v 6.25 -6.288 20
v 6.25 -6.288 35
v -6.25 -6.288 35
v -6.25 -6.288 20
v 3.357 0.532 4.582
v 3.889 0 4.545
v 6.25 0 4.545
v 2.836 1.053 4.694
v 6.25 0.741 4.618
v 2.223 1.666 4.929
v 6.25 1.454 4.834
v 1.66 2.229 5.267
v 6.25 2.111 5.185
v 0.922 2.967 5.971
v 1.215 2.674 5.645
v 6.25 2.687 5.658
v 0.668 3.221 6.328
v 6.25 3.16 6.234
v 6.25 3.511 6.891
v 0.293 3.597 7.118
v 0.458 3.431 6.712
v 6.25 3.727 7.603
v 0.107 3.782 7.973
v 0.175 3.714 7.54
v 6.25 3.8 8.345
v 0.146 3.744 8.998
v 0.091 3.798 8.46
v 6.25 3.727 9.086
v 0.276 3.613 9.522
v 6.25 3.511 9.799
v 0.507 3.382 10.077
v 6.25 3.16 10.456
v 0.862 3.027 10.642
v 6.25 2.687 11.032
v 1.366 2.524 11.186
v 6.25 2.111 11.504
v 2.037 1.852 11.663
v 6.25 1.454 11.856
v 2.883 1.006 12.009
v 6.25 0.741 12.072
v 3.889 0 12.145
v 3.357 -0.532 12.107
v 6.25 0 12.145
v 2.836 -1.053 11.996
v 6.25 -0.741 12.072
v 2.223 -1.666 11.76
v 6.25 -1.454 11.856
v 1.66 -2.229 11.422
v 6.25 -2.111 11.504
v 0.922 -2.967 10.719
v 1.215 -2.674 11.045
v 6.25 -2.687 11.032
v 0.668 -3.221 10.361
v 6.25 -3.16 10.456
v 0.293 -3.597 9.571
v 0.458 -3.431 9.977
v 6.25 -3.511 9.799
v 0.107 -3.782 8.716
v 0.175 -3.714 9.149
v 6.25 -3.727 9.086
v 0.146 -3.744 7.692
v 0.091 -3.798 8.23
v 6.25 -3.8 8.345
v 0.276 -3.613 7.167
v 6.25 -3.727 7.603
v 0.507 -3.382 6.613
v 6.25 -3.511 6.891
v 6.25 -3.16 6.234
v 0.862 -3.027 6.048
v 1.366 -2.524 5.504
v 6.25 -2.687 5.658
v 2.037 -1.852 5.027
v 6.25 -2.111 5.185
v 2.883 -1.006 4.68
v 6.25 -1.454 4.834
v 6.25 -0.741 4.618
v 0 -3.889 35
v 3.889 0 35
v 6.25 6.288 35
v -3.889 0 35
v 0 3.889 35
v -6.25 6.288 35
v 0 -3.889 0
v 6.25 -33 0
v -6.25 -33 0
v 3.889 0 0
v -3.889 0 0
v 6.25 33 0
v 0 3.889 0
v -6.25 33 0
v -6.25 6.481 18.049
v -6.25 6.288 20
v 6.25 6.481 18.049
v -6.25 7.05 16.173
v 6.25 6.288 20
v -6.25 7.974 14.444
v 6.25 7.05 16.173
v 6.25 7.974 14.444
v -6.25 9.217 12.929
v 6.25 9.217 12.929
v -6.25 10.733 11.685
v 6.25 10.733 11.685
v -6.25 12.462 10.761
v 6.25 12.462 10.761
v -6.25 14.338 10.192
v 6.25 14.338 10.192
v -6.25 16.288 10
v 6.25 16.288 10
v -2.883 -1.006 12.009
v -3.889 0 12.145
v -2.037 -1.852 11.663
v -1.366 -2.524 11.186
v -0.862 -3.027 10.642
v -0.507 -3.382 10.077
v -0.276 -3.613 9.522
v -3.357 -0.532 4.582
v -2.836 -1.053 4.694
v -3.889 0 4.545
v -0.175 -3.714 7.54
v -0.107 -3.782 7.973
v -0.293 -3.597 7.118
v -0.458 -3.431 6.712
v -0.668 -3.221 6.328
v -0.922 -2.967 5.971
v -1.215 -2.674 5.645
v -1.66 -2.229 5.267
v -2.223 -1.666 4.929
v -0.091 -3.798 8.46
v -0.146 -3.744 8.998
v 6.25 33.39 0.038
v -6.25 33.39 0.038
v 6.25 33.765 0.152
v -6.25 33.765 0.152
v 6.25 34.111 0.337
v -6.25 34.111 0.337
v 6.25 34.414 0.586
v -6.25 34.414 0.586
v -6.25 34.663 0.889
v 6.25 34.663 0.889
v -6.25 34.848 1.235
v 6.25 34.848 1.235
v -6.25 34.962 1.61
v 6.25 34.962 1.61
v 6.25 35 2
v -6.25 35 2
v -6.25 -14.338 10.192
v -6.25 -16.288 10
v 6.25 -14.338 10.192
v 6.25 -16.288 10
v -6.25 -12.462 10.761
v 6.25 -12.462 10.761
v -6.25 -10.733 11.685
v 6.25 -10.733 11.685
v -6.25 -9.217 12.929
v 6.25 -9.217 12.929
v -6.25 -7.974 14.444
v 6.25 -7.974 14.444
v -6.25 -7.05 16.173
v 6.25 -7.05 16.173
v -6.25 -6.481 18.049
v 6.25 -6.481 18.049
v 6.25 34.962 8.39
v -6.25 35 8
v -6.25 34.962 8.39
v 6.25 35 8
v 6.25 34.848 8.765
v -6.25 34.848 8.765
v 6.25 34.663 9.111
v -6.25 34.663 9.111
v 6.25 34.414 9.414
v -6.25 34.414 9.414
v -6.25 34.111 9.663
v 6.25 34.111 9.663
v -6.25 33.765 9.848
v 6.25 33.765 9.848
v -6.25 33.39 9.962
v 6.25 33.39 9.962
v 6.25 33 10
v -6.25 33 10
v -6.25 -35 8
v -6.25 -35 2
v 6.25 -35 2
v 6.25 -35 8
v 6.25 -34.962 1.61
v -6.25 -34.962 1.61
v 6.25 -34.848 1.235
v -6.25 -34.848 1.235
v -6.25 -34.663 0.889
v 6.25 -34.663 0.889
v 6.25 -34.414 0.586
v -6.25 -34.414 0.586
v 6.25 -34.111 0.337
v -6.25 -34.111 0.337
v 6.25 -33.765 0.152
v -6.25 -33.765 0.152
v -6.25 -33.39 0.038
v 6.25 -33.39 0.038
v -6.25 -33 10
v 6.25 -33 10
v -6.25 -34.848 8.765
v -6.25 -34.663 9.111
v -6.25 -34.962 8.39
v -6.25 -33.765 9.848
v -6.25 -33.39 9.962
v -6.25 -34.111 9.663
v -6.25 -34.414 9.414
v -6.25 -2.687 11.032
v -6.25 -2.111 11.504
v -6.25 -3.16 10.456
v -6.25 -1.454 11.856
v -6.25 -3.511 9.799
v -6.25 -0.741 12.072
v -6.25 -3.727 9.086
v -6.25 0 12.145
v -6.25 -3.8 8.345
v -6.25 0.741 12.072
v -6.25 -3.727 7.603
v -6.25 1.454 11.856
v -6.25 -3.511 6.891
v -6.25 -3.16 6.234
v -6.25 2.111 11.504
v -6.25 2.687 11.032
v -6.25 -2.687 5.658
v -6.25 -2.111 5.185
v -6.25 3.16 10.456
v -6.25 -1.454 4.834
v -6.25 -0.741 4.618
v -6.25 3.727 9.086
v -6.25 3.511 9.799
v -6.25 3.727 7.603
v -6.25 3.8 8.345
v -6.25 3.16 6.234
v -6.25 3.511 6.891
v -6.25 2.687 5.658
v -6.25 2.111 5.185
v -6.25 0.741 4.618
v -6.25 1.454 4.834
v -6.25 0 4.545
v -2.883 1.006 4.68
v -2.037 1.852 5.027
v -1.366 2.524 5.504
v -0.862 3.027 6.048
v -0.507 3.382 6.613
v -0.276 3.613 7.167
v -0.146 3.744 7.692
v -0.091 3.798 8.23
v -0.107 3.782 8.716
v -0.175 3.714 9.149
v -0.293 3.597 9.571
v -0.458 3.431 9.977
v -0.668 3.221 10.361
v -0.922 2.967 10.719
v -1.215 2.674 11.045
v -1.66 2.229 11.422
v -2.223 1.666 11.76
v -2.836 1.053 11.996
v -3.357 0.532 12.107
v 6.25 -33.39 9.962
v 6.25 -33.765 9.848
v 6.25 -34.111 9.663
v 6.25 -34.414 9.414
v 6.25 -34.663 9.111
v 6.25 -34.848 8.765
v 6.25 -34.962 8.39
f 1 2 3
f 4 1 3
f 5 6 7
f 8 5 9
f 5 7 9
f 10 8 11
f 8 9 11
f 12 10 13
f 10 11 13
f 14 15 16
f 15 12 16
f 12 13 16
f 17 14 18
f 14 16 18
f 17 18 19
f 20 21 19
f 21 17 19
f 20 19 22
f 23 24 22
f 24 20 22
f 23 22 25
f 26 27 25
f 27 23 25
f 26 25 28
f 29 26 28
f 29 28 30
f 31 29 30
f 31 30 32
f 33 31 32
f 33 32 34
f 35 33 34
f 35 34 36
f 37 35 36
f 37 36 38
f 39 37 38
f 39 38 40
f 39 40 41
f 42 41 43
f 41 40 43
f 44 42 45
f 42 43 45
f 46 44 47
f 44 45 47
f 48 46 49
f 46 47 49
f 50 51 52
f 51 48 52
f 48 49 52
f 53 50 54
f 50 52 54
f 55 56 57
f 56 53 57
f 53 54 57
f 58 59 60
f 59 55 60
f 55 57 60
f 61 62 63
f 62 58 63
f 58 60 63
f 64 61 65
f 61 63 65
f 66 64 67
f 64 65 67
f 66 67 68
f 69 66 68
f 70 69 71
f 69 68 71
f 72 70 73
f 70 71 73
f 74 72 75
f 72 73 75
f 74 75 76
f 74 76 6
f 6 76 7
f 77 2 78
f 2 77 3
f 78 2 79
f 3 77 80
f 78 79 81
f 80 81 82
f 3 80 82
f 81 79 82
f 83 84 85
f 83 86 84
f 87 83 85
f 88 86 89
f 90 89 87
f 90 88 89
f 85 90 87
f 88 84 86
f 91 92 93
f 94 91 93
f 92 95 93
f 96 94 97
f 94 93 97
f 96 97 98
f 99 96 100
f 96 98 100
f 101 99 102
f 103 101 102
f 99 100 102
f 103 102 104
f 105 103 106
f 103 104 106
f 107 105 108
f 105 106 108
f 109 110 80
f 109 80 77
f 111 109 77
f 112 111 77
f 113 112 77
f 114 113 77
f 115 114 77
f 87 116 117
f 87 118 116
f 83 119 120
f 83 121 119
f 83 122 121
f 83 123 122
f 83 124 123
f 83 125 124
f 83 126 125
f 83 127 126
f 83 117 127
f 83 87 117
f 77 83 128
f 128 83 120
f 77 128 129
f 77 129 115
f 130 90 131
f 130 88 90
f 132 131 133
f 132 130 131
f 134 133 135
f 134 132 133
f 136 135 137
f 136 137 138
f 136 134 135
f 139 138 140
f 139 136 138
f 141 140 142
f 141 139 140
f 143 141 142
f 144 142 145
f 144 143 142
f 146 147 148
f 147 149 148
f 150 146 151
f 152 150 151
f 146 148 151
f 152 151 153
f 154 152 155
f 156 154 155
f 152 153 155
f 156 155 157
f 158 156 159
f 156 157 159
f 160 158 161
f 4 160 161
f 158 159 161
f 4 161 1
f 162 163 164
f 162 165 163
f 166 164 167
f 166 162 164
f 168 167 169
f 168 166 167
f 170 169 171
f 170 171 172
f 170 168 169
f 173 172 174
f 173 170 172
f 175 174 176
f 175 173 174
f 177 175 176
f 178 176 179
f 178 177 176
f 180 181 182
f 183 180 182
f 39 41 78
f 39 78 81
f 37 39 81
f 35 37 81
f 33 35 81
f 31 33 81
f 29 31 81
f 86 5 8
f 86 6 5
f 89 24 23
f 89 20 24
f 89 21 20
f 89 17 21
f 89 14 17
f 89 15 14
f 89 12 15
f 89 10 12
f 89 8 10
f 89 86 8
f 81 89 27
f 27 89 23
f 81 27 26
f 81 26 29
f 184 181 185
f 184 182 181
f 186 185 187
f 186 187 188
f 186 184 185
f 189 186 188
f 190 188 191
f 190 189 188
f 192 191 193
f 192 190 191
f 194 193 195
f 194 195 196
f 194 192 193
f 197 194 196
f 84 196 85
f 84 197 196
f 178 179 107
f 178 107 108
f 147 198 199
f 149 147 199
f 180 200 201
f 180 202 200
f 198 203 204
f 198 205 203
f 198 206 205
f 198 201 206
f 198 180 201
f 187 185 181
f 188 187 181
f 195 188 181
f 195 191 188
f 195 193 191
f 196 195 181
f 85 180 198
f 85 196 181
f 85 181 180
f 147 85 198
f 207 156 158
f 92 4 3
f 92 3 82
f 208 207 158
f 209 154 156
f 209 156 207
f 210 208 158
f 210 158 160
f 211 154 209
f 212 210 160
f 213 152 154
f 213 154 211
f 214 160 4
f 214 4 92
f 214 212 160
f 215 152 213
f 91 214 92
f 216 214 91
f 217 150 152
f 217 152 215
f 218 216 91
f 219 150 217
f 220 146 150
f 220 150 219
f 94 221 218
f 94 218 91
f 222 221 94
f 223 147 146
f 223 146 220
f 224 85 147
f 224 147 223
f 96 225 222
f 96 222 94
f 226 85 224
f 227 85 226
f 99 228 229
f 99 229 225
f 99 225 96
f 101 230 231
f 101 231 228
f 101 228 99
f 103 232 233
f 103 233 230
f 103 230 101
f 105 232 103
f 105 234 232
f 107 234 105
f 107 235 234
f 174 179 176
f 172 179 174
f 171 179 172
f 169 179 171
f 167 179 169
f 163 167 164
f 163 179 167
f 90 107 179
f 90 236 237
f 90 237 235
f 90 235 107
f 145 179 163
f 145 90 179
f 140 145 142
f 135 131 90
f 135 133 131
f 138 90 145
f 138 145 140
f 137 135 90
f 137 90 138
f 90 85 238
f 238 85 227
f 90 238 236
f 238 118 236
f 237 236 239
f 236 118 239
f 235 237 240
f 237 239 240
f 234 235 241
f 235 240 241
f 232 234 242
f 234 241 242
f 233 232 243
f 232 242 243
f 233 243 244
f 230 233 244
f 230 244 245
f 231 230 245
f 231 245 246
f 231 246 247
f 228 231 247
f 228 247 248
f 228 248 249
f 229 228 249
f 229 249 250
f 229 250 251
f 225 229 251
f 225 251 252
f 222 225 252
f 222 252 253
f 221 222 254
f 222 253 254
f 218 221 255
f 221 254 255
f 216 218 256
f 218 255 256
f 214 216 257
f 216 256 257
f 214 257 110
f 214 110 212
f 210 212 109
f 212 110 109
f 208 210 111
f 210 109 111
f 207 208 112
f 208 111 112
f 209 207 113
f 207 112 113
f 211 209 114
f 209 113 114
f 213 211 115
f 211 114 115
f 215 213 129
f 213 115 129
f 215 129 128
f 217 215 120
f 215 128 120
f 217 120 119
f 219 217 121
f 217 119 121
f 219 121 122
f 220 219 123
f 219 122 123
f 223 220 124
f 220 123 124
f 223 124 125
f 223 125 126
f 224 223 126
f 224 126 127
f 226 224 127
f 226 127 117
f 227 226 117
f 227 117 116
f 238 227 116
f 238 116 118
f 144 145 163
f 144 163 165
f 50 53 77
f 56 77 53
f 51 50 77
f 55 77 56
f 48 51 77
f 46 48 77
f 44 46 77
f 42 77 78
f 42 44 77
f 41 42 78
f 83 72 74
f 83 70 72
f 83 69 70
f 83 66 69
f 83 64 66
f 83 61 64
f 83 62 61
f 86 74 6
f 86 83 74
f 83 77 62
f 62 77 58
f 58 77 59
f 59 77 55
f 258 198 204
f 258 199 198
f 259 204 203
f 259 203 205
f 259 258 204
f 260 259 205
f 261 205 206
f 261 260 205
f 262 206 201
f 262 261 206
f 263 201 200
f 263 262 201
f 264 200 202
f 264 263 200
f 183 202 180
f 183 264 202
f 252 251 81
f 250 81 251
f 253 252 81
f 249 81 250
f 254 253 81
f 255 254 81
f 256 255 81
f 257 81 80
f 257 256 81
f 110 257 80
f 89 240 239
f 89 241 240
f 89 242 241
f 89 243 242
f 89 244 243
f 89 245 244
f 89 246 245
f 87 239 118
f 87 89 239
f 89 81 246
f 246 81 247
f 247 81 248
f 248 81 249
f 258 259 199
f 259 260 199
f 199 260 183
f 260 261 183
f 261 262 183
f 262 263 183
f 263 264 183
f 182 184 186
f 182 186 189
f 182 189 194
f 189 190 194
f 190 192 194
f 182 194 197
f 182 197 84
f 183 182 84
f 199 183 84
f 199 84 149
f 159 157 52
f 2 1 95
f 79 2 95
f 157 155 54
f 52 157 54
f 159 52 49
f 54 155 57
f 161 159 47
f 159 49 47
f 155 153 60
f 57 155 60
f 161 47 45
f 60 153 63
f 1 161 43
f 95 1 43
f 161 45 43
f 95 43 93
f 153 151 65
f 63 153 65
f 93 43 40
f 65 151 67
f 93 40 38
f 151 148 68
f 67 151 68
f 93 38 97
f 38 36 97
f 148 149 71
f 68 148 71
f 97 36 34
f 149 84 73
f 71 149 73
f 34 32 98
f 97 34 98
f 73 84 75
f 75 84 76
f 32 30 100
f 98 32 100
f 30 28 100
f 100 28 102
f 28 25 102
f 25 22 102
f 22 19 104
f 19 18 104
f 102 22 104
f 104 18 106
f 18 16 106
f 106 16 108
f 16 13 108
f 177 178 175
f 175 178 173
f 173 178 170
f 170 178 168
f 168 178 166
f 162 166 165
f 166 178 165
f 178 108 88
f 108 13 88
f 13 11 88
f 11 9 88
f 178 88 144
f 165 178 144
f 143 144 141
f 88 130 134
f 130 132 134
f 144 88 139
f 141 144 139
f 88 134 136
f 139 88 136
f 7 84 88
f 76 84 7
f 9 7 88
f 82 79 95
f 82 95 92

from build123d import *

# Parameters (mm, degrees)
ESQUISSE1_W             = 12.5
ESQUISSE1_H             = 70
BOSS_EXTRU_1_DEPTH      = 10
ESQUISSE2_W             = 12.5
ESQUISSE2_H             = 12.576917286
BOSS_EXTRU_2_DEPTH      = 35
ENL_V_MAT_EXTRU_1_DEPTH = 40
CONG_1_R                = 10
CONG_3_R                = 2
D_GAGEMENT_M71_D        = 7.6
D_GAGEMENT_M71_DEPTH    = 12.5
D_GAGEMENT_M71_TIP      = 2.283270352


with BuildPart() as part:
    # Esquisse1 → Boss.-Extru.1 (new body)
    with BuildSketch(Plane.XY):
        Rectangle(ESQUISSE1_W, ESQUISSE1_H)
    extrude(amount=BOSS_EXTRU_1_DEPTH)

    # Esquisse2 → Boss.-Extru.2 (add)
    with BuildSketch(Plane(origin=(0, 0, 0), x_dir=(-1, 0, 0), z_dir=(0, 0, -1))):
        Rectangle(ESQUISSE2_W, ESQUISSE2_H)
    extrude(amount=-BOSS_EXTRU_2_DEPTH)

    # Esquisse3 → Enlèv. mat.-Extru.1 (cut)
    with BuildSketch(Plane(origin=(0, 0, 0), x_dir=(-1, 0, 0), z_dir=(0, 0, -1))):
        Polygon((-3.889087297, 0), (0, 3.889087297), (3.889087297, 0), (0, -3.889087297), align=None)
    extrude(amount=-ENL_V_MAT_EXTRU_1_DEPTH, mode=Mode.SUBTRACT)

    # Congé1
    cong_1_edges = [part.edges().sort_by_distance(p)[0] for p in [
        (0, -6.288458643, 10),
        (0, 6.288458643, 10),
    ]]
    fillet(cong_1_edges, radius=CONG_1_R)

    # Congé3
    cong_3_edges = [part.edges().sort_by_distance(p)[0] for p in [
        (0, -35, 10),
        (0, -35, 0),
        (0, 35, 0),
        (0, 35, 10),
    ]]
    fillet(cong_3_edges, radius=CONG_3_R)

    # Dégagement M71
    with Locations(Plane.ZY.offset(6.25)):
        with Locations((8.344762473, 0)):
            Hole(D_GAGEMENT_M71_D / 2, depth=D_GAGEMENT_M71_DEPTH)
            with Locations((0, 0, -(D_GAGEMENT_M71_DEPTH + D_GAGEMENT_M71_TIP / 2))):  # 118° drill point
                Cone(0, D_GAGEMENT_M71_D / 2, D_GAGEMENT_M71_TIP, mode=Mode.SUBTRACT)


solid = part.part
